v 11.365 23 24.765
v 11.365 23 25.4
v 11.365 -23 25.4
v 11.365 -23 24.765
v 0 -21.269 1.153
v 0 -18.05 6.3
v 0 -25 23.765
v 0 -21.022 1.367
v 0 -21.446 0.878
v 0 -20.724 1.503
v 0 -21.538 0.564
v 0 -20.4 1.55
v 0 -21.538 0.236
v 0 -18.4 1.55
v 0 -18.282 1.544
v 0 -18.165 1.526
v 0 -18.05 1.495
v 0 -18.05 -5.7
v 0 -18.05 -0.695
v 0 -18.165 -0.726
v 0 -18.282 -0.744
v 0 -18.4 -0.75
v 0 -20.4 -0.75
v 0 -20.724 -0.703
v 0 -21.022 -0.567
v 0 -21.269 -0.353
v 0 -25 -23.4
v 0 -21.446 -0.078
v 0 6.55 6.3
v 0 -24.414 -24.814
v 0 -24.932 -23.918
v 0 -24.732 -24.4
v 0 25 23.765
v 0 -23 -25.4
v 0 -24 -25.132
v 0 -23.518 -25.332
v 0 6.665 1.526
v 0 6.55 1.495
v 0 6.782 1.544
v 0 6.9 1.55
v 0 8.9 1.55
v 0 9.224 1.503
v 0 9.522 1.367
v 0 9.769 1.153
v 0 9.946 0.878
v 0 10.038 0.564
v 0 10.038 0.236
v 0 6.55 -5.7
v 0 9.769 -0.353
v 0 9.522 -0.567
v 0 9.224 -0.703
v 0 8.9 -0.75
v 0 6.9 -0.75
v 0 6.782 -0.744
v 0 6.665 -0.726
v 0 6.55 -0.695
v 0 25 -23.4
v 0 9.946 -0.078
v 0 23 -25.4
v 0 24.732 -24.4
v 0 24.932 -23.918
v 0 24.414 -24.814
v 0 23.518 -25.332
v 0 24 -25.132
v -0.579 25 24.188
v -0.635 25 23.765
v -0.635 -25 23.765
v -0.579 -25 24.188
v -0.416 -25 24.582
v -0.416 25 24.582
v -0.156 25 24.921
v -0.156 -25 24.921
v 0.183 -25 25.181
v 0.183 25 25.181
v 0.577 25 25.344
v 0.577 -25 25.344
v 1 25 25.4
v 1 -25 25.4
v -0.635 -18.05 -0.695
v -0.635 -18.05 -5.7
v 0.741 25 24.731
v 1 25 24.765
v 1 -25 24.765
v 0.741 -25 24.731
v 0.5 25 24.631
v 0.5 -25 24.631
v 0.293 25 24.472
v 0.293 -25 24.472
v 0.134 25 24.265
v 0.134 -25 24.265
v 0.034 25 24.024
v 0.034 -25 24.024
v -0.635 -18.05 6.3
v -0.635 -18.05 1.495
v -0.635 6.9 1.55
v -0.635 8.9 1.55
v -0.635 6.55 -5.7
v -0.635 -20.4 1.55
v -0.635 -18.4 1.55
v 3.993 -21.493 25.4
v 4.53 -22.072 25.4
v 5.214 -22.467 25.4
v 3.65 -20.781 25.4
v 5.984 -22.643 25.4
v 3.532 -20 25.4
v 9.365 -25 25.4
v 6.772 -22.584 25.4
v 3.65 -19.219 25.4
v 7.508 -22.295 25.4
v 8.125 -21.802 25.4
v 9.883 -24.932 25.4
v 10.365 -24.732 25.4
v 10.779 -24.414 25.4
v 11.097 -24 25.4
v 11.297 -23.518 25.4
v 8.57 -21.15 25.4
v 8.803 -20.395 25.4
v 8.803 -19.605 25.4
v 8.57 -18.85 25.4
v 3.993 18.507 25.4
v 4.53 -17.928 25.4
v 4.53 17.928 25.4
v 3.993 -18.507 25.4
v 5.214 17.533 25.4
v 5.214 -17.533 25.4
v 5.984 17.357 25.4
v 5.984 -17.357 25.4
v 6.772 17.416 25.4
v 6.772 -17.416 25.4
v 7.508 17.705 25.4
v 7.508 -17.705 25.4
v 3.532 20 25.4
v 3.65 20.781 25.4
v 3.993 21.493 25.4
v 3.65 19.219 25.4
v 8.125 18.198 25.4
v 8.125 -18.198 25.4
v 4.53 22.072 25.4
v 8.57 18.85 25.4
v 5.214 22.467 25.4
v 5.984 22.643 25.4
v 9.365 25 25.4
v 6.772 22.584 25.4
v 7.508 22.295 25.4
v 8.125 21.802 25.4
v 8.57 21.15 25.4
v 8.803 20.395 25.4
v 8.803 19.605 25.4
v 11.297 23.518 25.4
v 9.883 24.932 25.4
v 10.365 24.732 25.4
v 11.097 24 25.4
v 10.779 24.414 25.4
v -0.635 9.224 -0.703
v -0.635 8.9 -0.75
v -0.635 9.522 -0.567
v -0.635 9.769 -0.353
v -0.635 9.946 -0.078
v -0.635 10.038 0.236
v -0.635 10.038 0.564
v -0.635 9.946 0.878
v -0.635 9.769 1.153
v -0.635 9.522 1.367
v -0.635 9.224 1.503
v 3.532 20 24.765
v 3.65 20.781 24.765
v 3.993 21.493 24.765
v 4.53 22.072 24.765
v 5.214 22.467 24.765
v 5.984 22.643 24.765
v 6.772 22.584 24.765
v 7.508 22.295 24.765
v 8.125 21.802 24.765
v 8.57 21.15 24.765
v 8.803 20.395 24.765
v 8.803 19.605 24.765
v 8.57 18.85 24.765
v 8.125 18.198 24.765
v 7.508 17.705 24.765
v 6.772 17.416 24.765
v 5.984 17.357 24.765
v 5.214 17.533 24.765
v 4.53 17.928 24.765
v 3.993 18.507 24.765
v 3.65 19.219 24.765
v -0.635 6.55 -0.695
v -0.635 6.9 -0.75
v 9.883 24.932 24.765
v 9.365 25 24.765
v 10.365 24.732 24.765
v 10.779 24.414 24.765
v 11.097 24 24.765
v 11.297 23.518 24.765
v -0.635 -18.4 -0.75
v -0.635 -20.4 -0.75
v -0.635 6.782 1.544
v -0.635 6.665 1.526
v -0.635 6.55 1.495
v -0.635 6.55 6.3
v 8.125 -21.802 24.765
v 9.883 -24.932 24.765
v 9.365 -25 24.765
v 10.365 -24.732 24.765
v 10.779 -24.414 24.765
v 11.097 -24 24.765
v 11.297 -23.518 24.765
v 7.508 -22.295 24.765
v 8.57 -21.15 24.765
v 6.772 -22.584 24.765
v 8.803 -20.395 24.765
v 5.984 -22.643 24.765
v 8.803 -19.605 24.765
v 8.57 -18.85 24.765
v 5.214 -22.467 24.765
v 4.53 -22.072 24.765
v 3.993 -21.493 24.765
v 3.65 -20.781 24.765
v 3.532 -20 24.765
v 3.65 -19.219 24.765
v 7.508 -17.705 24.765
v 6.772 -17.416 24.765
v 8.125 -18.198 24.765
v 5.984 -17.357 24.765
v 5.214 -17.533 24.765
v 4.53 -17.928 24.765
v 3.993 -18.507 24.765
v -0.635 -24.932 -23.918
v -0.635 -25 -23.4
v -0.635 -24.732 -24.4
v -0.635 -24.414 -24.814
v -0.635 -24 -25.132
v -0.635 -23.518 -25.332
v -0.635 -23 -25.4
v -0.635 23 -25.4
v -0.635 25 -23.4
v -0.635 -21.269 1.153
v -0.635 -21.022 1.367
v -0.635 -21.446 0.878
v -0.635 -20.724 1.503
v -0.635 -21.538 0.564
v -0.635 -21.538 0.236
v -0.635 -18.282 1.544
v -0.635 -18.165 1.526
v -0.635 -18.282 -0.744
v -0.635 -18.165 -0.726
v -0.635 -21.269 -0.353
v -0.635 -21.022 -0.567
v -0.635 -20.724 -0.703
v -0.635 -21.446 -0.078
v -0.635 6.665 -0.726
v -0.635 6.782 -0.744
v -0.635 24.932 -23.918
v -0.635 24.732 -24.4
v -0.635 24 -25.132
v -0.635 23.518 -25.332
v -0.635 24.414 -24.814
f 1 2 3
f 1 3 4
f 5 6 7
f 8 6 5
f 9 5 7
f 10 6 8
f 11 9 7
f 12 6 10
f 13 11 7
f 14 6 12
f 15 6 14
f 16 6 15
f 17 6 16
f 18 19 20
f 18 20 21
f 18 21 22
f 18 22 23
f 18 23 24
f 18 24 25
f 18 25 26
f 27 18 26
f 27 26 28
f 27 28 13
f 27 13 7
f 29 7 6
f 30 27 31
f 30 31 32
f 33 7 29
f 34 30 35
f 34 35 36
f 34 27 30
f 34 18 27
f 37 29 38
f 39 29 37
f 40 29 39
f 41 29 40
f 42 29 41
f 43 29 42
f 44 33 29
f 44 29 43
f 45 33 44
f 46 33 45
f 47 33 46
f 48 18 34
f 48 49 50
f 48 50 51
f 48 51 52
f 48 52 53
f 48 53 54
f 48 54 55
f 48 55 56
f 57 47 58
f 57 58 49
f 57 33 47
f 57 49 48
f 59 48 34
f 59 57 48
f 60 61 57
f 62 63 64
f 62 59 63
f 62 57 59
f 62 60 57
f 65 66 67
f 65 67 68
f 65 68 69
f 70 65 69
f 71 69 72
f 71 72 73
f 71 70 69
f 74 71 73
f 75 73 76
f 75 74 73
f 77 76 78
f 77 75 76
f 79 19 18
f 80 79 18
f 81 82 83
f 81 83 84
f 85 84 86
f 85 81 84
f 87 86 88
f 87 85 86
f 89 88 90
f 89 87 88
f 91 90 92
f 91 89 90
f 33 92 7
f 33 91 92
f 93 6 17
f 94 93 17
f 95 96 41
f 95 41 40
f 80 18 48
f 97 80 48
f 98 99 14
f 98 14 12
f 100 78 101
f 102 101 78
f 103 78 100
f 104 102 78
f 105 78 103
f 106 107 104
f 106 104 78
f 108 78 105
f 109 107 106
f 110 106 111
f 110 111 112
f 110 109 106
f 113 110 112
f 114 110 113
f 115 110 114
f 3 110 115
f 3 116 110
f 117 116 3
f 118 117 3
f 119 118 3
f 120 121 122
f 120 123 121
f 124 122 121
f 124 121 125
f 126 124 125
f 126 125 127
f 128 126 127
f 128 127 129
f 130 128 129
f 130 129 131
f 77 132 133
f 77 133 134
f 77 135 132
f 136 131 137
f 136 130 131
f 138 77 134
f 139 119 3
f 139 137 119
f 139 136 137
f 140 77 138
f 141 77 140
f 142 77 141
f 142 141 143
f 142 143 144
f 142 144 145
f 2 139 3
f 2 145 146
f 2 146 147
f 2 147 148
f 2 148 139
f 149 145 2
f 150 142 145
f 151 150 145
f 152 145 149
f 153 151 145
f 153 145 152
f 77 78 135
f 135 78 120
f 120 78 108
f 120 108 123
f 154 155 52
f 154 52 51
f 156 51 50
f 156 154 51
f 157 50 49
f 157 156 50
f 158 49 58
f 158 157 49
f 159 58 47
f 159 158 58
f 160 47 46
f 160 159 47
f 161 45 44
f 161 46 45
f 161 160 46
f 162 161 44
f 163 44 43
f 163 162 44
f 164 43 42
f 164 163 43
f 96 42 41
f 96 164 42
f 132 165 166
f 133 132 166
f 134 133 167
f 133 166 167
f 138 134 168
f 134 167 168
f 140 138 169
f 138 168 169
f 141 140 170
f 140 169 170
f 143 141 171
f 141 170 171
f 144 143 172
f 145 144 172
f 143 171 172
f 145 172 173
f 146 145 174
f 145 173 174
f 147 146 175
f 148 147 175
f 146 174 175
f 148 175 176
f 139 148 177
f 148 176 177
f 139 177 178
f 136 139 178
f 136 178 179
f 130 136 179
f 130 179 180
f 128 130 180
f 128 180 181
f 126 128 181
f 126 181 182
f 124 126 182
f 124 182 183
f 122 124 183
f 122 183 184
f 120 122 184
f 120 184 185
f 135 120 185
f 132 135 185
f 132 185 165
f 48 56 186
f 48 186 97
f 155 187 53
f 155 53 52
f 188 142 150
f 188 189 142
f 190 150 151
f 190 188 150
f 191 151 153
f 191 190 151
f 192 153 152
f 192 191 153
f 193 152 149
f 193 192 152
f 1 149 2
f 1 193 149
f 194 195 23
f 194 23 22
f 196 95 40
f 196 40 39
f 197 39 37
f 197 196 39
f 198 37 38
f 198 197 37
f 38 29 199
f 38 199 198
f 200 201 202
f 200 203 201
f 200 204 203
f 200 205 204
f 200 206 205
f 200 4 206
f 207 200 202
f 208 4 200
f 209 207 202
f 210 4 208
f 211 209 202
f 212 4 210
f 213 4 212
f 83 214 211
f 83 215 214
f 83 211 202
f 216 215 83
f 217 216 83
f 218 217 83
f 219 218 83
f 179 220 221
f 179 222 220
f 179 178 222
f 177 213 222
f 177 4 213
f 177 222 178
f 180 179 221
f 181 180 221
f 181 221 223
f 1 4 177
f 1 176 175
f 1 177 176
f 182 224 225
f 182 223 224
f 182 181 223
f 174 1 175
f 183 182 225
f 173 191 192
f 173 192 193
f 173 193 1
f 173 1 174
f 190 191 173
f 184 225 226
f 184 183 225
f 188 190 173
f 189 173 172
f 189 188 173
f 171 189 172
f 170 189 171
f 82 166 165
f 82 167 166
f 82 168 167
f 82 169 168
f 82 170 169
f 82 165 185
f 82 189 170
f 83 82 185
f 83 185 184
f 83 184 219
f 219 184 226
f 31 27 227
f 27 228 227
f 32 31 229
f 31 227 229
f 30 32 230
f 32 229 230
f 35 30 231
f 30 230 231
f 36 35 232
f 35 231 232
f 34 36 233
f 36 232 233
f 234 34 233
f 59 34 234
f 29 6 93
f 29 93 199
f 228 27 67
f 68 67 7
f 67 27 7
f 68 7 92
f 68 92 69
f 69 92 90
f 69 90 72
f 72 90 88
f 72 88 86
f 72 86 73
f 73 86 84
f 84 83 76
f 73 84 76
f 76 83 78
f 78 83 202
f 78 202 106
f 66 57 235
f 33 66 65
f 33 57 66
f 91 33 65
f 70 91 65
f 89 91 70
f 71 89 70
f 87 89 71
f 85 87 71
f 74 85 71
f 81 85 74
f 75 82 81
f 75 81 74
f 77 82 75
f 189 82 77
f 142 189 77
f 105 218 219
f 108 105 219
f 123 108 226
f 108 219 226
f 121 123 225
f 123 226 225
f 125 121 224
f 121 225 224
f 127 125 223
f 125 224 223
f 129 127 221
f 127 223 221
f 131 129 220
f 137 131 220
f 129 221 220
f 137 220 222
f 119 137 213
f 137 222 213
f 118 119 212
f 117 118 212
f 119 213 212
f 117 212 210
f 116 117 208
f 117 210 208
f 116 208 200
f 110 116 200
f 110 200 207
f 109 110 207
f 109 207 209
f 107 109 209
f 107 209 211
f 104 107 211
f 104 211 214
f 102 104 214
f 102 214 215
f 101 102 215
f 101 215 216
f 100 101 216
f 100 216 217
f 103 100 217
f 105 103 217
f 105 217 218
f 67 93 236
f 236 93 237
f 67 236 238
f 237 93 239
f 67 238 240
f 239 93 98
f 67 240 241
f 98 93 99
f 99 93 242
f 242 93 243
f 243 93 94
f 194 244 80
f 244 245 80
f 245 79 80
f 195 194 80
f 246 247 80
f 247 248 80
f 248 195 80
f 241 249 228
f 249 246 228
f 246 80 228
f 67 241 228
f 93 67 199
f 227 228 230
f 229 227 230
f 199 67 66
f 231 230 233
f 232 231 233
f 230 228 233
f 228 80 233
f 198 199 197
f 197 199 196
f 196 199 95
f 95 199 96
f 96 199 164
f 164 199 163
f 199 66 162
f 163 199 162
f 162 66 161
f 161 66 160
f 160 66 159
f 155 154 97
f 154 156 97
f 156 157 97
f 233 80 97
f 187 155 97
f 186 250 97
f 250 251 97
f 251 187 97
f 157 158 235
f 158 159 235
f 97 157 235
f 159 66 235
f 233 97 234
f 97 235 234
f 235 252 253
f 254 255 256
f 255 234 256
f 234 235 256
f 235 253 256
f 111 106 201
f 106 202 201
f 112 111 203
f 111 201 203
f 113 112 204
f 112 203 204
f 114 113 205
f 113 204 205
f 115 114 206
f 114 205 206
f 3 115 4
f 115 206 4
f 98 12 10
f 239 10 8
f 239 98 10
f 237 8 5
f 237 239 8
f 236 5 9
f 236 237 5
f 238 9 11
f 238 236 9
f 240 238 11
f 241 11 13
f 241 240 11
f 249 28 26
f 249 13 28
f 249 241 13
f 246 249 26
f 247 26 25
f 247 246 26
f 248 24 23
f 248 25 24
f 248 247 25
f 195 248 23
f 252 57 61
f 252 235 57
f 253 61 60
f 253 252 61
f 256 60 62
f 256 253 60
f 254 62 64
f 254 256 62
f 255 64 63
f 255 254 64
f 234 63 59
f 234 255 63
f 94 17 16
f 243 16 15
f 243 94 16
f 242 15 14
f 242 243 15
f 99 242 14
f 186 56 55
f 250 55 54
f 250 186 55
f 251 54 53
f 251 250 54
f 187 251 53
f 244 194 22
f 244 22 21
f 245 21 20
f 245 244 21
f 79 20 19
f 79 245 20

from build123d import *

# Parameters (mm, degrees)
SKETCH1_W                    = 50.8
SKETCH1_H                    = 50
BASE_FLANGE1_DEPTH           = 0.635
SKETCH9_W                    = 12
SKETCH9_H                    = 24.6
CUT_EXTRUDE1_DEPTH           = 36.644960724
CUT_EXTRUDE2_DEPTH           = 36.644960724
EDGE_FLANGE1_STRIP_W         = 4.54
EDGE_FLANGE1_STRIP_H         = 0.635
EDGE_FLANGE1_STRIP_CUT_DEPTH = 50
EDGE_FLANGE1_DEPTH           = 50
SKETCH14_R                   = 2.65
CUT_EXTRUDE3_DEPTH           = 58.189950603
FILLET1_R                    = 2


# Sheet-metal steps are written as plain solids
with BuildPart() as part:
    # Sketch1 → Base-Flange1 (new body)
    with BuildSketch(Plane(origin=(0, 0, 0), x_dir=(0, 0, -1), z_dir=(1, 0, 0))):
        Rectangle(SKETCH1_W, SKETCH1_H)
    extrude(amount=-BASE_FLANGE1_DEPTH)

    # Sketch9 → Cut-Extrude1 (cut, through all)
    with BuildSketch(Plane(origin=(0, 0, 0), x_dir=(0, 0, -1), z_dir=(1, 0, 0))):
        with Locations((-0.3, -5.75)):
            Rectangle(SKETCH9_W, SKETCH9_H)
    extrude(amount=-CUT_EXTRUDE1_DEPTH, mode=Mode.SUBTRACT)

    # Sketch10 → Cut-Extrude2 (cut, through all)
    with BuildSketch(Plane.ZY.offset(0.635)):
        with BuildLine():
            Line((-0.75, -20.4), (-0.75, -18.4))
            ThreePointArc((-0.75, -18.4), (0.4, -17.25), (1.55, -18.4))
            Line((1.55, -18.4), (1.55, -20.4))
            ThreePointArc((1.55, -20.4), (0.4, -21.55), (-0.75, -20.4))
        make_face()
        with BuildLine():
            Line((-0.75, 6.9), (-0.75, 8.9))
            ThreePointArc((-0.75, 8.9), (0.4, 10.05), (1.55, 8.9))
            Line((1.55, 8.9), (1.55, 6.9))
            ThreePointArc((1.55, 6.9), (0.4, 5.75), (-0.75, 6.9))
        make_face()
    extrude(amount=-CUT_EXTRUDE2_DEPTH, mode=Mode.SUBTRACT)

    # Edge-Flange1 strip (across the edge) → Edge-Flange1 strip cut (cut)
    with BuildSketch(Plane(origin=(0, 25, 25.4), x_dir=(0, 0, -1), z_dir=(0, -1, 0))):
        with Locations((-0.635, -0.3175)):
            Rectangle(EDGE_FLANGE1_STRIP_W, EDGE_FLANGE1_STRIP_H)
    extrude(amount=EDGE_FLANGE1_STRIP_CUT_DEPTH, mode=Mode.SUBTRACT)

    # Edge-Flange1 section (across the edge) → Edge-Flange1 (add)
    with BuildSketch(Plane(origin=(0, 25, 25.4), x_dir=(0, 0, -1), z_dir=(0, -1, 0))):
        with BuildLine():
            Line((0, 1), (0, 11.365))
            Line((0, 11.365), (0.635, 11.365))
            Line((0.635, 11.365), (0.635, 1))
            ThreePointArc((0.635, 1), (0.927893219, 0.292893219), (1.635, 0))
            Line((1.635, 0), (1.635, -0.635))
            ThreePointArc((1.635, -0.635), (0.478880413, -0.156119587), (0, 1))
        make_face()
    extrude(amount=EDGE_FLANGE1_DEPTH)

    # Sketch14 → Cut-Extrude3 (cut, through all)
    with BuildSketch(Plane(origin=(0, 0, 24.765), x_dir=(-1, 0, 0), z_dir=(0, 0, -1))):
        with Locations((-6.1825, -20)):
            Circle(SKETCH14_R)
        with Locations((-6.1825, 20)):
            Circle(SKETCH14_R)
    extrude(amount=-CUT_EXTRUDE3_DEPTH, mode=Mode.SUBTRACT)

    # Fillet1
    fillet1_edges = [part.edges().sort_by_distance(p)[0] for p in [
        (11.365, 25, 25.0825),
        (11.365, -25, 25.0825),
        (-0.3175, -25, -25.4),
        (-0.3175, 25, -25.4),
    ]]
    fillet(fillet1_edges, radius=FILLET1_R)


solid = part.part
